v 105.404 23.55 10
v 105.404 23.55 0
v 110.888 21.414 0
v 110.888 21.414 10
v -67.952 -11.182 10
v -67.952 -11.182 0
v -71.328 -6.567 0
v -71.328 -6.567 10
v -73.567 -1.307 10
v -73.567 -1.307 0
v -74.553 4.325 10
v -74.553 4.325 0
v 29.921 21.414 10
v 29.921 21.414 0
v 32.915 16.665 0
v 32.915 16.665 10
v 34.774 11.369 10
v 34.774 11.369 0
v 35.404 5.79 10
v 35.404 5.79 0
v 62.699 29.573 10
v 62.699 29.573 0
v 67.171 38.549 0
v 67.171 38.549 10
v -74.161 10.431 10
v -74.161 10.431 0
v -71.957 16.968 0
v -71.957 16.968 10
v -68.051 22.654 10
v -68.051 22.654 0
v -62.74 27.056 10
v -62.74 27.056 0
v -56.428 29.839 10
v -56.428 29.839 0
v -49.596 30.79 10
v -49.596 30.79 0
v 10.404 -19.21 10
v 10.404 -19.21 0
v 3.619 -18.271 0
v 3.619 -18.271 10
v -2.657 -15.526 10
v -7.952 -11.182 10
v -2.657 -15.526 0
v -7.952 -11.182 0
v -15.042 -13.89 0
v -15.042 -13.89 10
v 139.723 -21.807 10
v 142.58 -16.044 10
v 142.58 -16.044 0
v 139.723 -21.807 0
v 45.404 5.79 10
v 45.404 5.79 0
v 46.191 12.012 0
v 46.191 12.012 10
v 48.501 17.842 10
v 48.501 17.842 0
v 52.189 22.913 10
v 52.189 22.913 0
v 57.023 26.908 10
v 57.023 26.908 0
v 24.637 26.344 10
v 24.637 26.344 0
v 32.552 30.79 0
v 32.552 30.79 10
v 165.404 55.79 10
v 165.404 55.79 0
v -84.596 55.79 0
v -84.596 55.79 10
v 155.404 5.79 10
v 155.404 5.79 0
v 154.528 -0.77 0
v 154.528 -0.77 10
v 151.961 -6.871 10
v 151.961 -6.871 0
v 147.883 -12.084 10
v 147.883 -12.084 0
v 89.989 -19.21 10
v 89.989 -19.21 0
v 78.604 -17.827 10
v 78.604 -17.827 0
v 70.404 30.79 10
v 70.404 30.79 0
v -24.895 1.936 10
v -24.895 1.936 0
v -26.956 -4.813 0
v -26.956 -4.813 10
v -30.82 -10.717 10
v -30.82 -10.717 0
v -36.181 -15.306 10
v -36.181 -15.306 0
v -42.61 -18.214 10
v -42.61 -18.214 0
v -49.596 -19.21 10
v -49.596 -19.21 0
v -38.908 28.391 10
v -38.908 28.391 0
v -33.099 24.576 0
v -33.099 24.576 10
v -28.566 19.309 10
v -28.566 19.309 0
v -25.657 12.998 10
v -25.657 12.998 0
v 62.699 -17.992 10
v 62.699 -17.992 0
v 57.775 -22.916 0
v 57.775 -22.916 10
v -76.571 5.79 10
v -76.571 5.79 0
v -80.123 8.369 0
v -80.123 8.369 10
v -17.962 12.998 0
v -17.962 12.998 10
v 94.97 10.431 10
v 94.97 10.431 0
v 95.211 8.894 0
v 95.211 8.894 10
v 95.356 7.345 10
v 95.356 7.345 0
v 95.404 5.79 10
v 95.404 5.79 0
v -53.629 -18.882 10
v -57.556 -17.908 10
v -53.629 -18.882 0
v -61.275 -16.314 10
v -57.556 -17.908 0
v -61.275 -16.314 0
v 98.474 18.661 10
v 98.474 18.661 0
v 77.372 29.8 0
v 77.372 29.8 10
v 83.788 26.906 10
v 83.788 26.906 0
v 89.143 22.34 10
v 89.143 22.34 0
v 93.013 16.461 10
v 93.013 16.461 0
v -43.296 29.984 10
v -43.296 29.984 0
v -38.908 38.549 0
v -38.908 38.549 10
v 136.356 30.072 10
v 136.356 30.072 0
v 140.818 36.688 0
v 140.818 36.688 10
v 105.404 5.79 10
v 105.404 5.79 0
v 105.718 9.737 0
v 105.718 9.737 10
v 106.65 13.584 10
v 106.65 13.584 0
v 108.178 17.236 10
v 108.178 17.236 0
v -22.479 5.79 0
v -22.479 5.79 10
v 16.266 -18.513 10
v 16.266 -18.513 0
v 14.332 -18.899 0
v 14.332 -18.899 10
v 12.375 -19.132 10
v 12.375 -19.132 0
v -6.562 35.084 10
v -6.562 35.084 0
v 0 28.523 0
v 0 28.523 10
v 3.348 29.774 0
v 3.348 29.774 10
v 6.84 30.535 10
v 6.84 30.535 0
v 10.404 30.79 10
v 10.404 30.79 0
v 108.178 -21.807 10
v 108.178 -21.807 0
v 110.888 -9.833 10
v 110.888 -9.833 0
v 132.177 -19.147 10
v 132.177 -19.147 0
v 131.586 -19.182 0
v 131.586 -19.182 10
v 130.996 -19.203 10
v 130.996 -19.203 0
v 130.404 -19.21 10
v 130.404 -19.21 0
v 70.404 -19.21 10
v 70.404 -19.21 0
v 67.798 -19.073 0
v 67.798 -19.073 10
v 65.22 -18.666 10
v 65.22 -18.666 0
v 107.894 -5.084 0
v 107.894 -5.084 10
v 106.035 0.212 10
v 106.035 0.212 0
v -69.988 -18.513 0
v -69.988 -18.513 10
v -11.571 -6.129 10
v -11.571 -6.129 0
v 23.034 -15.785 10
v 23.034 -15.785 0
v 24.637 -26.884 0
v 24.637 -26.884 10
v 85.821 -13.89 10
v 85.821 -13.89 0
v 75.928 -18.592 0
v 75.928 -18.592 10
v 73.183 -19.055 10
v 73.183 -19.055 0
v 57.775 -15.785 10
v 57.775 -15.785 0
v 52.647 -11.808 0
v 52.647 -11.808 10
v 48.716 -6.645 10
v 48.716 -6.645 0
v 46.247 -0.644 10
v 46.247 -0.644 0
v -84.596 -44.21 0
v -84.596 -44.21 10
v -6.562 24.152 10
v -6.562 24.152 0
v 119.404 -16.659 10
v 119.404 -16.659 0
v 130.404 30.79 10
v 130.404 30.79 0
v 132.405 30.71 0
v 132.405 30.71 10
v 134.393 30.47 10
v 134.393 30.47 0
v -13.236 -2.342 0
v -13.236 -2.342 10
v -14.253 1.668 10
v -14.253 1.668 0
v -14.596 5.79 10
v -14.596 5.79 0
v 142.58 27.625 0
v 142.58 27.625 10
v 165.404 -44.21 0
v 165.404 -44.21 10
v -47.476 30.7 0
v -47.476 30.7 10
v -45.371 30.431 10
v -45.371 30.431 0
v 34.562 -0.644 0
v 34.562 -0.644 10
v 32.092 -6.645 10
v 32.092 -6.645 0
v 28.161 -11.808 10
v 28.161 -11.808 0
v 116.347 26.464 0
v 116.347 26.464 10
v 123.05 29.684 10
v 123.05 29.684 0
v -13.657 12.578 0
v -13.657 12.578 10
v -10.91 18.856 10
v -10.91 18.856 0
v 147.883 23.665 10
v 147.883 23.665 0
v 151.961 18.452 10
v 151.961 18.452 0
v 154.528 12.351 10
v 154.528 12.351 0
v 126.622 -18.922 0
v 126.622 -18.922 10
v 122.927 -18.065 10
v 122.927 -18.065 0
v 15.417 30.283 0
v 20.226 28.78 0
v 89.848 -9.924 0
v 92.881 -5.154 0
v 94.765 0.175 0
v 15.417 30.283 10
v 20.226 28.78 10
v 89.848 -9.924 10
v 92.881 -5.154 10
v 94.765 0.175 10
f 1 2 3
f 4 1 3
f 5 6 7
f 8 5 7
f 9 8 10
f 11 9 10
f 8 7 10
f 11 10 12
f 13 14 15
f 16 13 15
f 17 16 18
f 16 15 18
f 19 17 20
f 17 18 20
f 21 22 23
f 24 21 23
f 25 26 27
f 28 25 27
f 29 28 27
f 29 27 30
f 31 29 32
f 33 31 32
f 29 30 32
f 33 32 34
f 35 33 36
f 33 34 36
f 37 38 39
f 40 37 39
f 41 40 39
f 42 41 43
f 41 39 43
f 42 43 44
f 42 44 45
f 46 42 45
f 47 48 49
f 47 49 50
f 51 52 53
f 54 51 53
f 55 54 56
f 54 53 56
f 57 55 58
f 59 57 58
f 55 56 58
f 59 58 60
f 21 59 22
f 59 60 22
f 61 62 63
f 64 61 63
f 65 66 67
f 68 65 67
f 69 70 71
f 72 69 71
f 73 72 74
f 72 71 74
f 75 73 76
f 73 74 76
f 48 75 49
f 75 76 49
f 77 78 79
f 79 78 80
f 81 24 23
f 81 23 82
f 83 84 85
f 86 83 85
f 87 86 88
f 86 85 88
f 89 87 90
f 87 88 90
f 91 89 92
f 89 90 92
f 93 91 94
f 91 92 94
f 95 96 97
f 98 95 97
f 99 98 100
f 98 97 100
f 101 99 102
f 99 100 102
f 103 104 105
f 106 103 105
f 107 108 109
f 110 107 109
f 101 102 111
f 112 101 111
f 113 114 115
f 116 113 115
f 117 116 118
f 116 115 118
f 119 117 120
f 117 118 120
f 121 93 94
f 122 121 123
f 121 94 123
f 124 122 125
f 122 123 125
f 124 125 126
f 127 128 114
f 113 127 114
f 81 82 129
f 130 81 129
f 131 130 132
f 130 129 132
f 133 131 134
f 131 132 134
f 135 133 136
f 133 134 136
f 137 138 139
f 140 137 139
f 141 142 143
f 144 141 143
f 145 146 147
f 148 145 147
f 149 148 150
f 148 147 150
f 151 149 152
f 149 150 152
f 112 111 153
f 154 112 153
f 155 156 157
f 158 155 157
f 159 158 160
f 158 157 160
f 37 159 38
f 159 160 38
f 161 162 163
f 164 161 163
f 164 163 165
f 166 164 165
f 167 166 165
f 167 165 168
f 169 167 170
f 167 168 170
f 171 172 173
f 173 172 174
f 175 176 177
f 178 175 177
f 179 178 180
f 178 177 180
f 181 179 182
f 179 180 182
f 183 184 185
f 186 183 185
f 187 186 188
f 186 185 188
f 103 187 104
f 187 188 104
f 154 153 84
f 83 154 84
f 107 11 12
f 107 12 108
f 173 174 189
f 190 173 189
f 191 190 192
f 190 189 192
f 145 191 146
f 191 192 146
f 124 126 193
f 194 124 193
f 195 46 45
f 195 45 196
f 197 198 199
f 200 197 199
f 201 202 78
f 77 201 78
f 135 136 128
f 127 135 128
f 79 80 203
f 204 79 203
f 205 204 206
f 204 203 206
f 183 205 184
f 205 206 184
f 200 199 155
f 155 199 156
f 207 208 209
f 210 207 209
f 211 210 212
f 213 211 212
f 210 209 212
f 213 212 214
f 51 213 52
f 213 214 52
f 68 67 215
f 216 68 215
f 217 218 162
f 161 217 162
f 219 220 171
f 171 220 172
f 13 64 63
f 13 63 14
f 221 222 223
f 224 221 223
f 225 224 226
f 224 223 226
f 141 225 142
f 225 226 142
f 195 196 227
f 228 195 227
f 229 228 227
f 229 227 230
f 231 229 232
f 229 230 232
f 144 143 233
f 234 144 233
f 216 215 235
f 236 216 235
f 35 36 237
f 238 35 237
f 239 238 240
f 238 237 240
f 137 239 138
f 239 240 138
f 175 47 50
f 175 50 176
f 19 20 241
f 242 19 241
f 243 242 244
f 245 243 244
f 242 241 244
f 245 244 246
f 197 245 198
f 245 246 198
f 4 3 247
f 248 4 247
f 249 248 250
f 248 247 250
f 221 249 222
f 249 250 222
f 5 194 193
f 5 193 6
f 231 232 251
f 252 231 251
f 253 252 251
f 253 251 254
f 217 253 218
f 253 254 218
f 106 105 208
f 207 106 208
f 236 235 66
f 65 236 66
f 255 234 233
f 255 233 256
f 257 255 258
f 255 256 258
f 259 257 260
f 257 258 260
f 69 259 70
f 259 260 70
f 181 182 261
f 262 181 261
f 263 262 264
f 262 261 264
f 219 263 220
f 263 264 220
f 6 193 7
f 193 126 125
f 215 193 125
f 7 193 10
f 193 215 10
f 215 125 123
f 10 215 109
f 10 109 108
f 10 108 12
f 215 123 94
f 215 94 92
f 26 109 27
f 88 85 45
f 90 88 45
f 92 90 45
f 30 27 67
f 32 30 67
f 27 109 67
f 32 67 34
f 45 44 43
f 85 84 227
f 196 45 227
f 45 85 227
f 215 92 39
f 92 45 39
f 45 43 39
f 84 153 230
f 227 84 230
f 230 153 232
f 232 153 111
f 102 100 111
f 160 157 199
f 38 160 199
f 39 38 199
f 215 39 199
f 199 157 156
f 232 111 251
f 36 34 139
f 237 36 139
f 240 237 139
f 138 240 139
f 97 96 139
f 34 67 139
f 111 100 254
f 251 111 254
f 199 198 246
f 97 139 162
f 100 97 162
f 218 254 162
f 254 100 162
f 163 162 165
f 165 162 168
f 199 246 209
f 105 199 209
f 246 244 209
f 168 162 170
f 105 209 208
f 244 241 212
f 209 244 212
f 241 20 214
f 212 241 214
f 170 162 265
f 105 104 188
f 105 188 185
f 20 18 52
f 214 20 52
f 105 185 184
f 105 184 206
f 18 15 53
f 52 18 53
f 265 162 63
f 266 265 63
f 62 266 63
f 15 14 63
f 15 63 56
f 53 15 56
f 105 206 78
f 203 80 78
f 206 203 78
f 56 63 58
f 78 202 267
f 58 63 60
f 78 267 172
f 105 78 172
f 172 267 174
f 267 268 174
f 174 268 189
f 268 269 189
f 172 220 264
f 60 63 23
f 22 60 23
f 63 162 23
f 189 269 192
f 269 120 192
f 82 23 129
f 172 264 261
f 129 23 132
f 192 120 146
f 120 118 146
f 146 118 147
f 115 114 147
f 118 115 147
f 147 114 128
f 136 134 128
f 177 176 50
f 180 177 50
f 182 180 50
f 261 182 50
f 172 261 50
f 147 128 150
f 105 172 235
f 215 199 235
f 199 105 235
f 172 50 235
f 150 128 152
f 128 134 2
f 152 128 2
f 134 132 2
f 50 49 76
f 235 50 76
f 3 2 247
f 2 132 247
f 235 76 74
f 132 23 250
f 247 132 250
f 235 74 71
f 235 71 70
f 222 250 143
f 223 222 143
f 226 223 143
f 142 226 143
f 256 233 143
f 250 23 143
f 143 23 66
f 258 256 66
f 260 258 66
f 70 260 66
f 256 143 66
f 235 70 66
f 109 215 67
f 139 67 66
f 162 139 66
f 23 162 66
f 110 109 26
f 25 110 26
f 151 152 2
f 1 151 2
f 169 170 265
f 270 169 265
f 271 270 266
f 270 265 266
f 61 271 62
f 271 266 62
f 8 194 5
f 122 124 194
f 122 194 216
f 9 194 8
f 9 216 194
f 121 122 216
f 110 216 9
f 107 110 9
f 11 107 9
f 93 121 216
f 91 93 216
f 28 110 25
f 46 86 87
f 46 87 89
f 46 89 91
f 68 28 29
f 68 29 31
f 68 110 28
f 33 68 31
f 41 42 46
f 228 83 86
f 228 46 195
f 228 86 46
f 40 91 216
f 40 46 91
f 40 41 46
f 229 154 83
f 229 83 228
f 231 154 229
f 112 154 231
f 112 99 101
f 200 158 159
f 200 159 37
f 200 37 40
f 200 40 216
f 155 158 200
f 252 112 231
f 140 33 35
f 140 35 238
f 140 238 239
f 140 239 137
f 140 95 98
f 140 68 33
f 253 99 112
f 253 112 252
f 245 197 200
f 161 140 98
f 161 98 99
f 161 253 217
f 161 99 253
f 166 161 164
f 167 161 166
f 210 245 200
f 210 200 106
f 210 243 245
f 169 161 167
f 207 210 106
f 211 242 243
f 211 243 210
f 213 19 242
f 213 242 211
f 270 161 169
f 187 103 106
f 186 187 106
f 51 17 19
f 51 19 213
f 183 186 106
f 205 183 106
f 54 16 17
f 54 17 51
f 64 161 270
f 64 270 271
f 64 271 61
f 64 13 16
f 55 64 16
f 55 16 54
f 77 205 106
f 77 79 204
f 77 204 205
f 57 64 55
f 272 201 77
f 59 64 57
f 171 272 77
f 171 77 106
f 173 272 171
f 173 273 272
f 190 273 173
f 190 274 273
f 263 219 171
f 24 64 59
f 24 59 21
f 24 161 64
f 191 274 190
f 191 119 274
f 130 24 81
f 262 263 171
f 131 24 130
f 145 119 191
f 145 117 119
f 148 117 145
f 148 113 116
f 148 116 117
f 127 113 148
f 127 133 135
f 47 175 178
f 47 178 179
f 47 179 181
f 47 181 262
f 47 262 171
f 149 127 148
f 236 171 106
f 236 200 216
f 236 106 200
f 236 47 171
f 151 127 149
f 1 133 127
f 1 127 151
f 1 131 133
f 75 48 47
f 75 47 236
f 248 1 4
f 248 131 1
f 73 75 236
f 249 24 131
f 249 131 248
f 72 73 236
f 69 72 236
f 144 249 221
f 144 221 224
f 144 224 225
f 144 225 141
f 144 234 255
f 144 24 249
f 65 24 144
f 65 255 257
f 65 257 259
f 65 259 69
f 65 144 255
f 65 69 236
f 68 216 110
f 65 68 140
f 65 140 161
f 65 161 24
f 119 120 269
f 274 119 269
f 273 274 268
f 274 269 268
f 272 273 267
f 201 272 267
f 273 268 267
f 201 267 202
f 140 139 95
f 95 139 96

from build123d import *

# Parameters (mm, degrees)
BOSS_EXTRUDE2_DEPTH = 10


with BuildPart() as part:
    # Sketch1 → Boss-Extrude2 (new body)
    with BuildSketch(Plane.XY):
        with BuildLine():
            Line((-49.595588235, 30.790441176), (-49.595588235, 55.790441176))
            Line((-49.595588235, 55.790441176), (-84.595588235, 55.790441176))
            Line((-84.595588235, 55.790441176), (-84.595588235, 5.790441176))
            Line((-84.595588235, 5.790441176), (-76.571127836, 5.790441176))
            Line((-76.571127836, 5.790441176), (-80.122995865, 8.369201143))
            Line((-80.122995865, 8.369201143), (-74.161024923, 10.431488509))
            ThreePointArc((-74.161024923, 10.431488509), (-65.548234046, 25.0391578), (-49.595588235, 30.790441176))
        make_face()
        with BuildLine():
            Line((10.404411765, 55.790441176), (-49.595588235, 55.790441176))
            Line((-49.595588235, 55.790441176), (-49.595588235, 30.790441176))
            ThreePointArc((-49.595588235, 30.790441176), (-46.420318597, 30.587974576), (-43.296479842, 29.983854194))
            Line((-43.296479842, 29.983854194), (-38.907655076, 38.5487403))
            Line((-38.907655076, 38.5487403), (-38.907655076, 28.390620042))
            ThreePointArc((-38.907655076, 28.390620042), (-30.648795615, 22.100531594), (-25.657089919, 12.997957973))
            Line((-25.657089919, 12.997957973), (-17.962154019, 12.997957973))
            Line((-17.962154019, 12.997957973), (-22.478851702, 5.790441176))
            Line((-22.478851702, 5.790441176), (-14.595588235, 5.790441176))
            ThreePointArc((-14.595588235, 5.790441176), (-12.499276658, 15.811471895), (-6.561903703, 24.151926396))
            Line((-6.561903703, 24.151926396), (-6.561903703, 35.084441479))
            Line((-6.561903703, 35.084441479), (0, 28.522537776))
            ThreePointArc((0, 28.522537776), (5.080053353, 30.216886016), (10.404411765, 30.790441176))
            Line((10.404411765, 30.790441176), (10.404411765, 55.790441176))
        make_face()
        with BuildLine():
            Line((70.404411765, 55.790441176), (10.404411765, 55.790441176))
            Line((10.404411765, 55.790441176), (10.404411765, 30.790441176))
            ThreePointArc((10.404411765, 30.790441176), (17.859813508, 29.652900917), (24.63674968, 26.343799964))
            Line((24.63674968, 26.343799964), (32.552494412, 30.790441176))
            Line((32.552494412, 30.790441176), (29.92126971, 21.41389329))
            ThreePointArc((29.92126971, 21.41389329), (33.993831518, 14.069286246), (35.404411765, 5.790441176))
            Line((35.404411765, 5.790441176), (45.404411765, 5.790441176))
            ThreePointArc((45.404411765, 5.790441176), (50.185133178, 20.493528384), (62.698873639, 29.573306483))
            Line((62.698873639, 29.573306483), (67.171172857, 38.5487403))
            Line((67.171172857, 38.5487403), (70.404411765, 30.790441176))
            Line((70.404411765, 30.790441176), (70.404411765, 55.790441176))
        make_face()
        with BuildLine():
            Line((130.404411765, 55.790441176), (70.404411765, 55.790441176))
            Line((70.404411765, 55.790441176), (70.404411765, 30.790441176))
            ThreePointArc((70.404411765, 30.790441176), (83.787720088, 26.906479118), (93.012607471, 16.461405843))
            Line((93.012607471, 16.461405843), (98.474145882, 18.660683713))
            Line((98.474145882, 18.660683713), (94.969848452, 10.431488509))
            ThreePointArc((94.969848452, 10.431488509), (95.295533849, 8.1211152), (95.404411765, 5.790441176))
            Line((95.404411765, 5.790441176), (105.404411765, 5.790441176))
            ThreePointArc((105.404411765, 5.790441176), (106.107781477, 11.678883811), (108.178312298, 17.23598627))
            Line((108.178312298, 17.23598627), (105.404411765, 23.549684511))
            Line((105.404411765, 23.549684511), (110.88755382, 21.41389329))
            ThreePointArc((110.88755382, 21.41389329), (119.578200582, 28.324707338), (130.404411765, 30.790441176))
            Line((130.404411765, 30.790441176), (130.404411765, 55.790441176))
        make_face()
        with BuildLine():
            Line((165.404411765, 55.790441176), (130.404411765, 55.790441176))
            Line((130.404411765, 55.790441176), (130.404411765, 30.790441176))
            ThreePointArc((130.404411765, 30.790441176), (133.401752606, 30.610109746), (136.355852267, 30.071717007))
            Line((136.355852267, 30.071717007), (140.818257218, 36.687543597))
            Line((140.818257218, 36.687543597), (142.579811014, 27.625267787))
            ThreePointArc((142.579811014, 27.625267787), (151.961139035, 18.451701358), (155.404411765, 5.790441176))
            Line((155.404411765, 5.790441176), (165.404411765, 5.790441176))
            Line((165.404411765, 5.790441176), (165.404411765, 55.790441176))
        make_face()
        with BuildLine():
            Line((165.404411765, -44.209558824), (165.404411765, 5.790441176))
            Line((165.404411765, 5.790441176), (155.404411765, 5.790441176))
            ThreePointArc((155.404411765, 5.790441176), (151.961139035, -6.870819005), (142.579811014, -16.044385434))
            Line((142.579811014, -16.044385434), (139.723435627, -21.807209952))
            Line((139.723435627, -21.807209952), (132.176529952, -19.14667167))
            ThreePointArc((132.176529952, -19.14667167), (131.291028602, -19.193832089), (130.404411765, -19.209558824))
            Line((130.404411765, -19.209558824), (130.404411765, -44.209558824))
            Line((130.404411765, -44.209558824), (165.404411765, -44.209558824))
        make_face()
        with BuildLine():
            ThreePointArc((78.603951233, -17.826661789), (74.562080934, -18.861410419), (70.404411765, -19.209558824))
            Line((70.404411765, -19.209558824), (70.404411765, -44.209558824))
            Line((70.404411765, -44.209558824), (130.404411765, -44.209558824))
            Line((130.404411765, -44.209558824), (130.404411765, -19.209558824))
            ThreePointArc((130.404411765, -19.209558824), (124.758153779, -18.563609221), (119.403671642, -16.659140484))
            Line((119.403671642, -16.659140484), (108.178312298, -21.807209952))
            Line((108.178312298, -21.807209952), (110.88755382, -9.833010937))
            ThreePointArc((110.88755382, -9.833010937), (106.814992011, -2.488403893), (105.404411765, 5.790441176))
            Line((105.404411765, 5.790441176), (95.404411765, 5.790441176))
            ThreePointArc((95.404411765, 5.790441176), (92.88136777, -5.154258396), (85.821495865, -13.889841287))
            Line((85.821495865, -13.889841287), (89.988841167, -19.209558824))
            Line((89.988841167, -19.209558824), (78.603951233, -17.826661789))
        make_face()
        with BuildLine():
            ThreePointArc((16.26584722, -18.512718585), (13.35576789, -19.034737514), (10.404411765, -19.209558824))
            Line((10.404411765, -19.209558824), (10.404411765, -44.209558824))
            Line((10.404411765, -44.209558824), (70.404411765, -44.209558824))
            Line((70.404411765, -44.209558824), (70.404411765, -19.209558824))
            ThreePointArc((70.404411765, -19.209558824), (66.503875434, -18.903400492), (62.698873639, -17.99242413))
            Line((62.698873639, -17.99242413), (57.774840306, -22.916457463))
            Line((57.774840306, -22.916457463), (57.774840306, -15.784867043))
            ThreePointArc((57.774840306, -15.784867043), (48.716404866, -6.644604331), (45.404411765, 5.790441176))
            Line((45.404411765, 5.790441176), (35.404411765, 5.790441176))
            ThreePointArc((35.404411765, 5.790441176), (32.092418663, -6.644604331), (23.033983223, -15.784867043))
            Line((23.033983223, -15.784867043), (24.63674968, -26.883621045))
            Line((24.63674968, -26.883621045), (16.26584722, -18.512718585))
        make_face()
        with BuildLine():
            ThreePointArc((-24.894580949, 1.935543121), (-33.337858557, -13.20129981), (-49.595588235, -19.209558824))
            Line((-49.595588235, -19.209558824), (-49.595588235, -44.209558824))
            Line((-49.595588235, -44.209558824), (10.404411765, -44.209558824))
            Line((10.404411765, -44.209558824), (10.404411765, -19.209558824))
            ThreePointArc((10.404411765, -19.209558824), (0.386918535, -17.114794674), (-7.951831841, -11.181545175))
            Line((-7.951831841, -11.181545175), (-15.042390882, -13.889841287))
            Line((-15.042390882, -13.889841287), (-11.571398063, -6.128610062))
            ThreePointArc((-11.571398063, -6.128610062), (-13.827749155, -0.357922603), (-14.595588235, 5.790441176))
            Line((-14.595588235, 5.790441176), (-22.478851702, 5.790441176))
            Line((-22.478851702, 5.790441176), (-24.894580949, 1.935543121))
        make_face()
        with BuildLine():
            Line((-76.571127836, 5.790441176), (-84.595588235, 5.790441176))
            Line((-84.595588235, 5.790441176), (-84.595588235, -44.209558824))
            Line((-84.595588235, -44.209558824), (-49.595588235, -44.209558824))
            Line((-49.595588235, -44.209558824), (-49.595588235, -19.209558824))
            ThreePointArc((-49.595588235, -19.209558824), (-55.612209406, -18.474765802), (-61.275152877, -16.313580398))
            Line((-61.275152877, -16.313580398), (-69.988075999, -18.512718585))
            Line((-69.988075999, -18.512718585), (-67.951831841, -11.181545175))
            ThreePointArc((-67.951831841, -11.181545175), (-72.598243173, -4.001283177), (-74.552596729, 4.324928615))
            Line((-74.552596729, 4.324928615), (-76.571127836, 5.790441176))
        make_face()
    extrude(amount=BOSS_EXTRUDE2_DEPTH)


solid = part.part
